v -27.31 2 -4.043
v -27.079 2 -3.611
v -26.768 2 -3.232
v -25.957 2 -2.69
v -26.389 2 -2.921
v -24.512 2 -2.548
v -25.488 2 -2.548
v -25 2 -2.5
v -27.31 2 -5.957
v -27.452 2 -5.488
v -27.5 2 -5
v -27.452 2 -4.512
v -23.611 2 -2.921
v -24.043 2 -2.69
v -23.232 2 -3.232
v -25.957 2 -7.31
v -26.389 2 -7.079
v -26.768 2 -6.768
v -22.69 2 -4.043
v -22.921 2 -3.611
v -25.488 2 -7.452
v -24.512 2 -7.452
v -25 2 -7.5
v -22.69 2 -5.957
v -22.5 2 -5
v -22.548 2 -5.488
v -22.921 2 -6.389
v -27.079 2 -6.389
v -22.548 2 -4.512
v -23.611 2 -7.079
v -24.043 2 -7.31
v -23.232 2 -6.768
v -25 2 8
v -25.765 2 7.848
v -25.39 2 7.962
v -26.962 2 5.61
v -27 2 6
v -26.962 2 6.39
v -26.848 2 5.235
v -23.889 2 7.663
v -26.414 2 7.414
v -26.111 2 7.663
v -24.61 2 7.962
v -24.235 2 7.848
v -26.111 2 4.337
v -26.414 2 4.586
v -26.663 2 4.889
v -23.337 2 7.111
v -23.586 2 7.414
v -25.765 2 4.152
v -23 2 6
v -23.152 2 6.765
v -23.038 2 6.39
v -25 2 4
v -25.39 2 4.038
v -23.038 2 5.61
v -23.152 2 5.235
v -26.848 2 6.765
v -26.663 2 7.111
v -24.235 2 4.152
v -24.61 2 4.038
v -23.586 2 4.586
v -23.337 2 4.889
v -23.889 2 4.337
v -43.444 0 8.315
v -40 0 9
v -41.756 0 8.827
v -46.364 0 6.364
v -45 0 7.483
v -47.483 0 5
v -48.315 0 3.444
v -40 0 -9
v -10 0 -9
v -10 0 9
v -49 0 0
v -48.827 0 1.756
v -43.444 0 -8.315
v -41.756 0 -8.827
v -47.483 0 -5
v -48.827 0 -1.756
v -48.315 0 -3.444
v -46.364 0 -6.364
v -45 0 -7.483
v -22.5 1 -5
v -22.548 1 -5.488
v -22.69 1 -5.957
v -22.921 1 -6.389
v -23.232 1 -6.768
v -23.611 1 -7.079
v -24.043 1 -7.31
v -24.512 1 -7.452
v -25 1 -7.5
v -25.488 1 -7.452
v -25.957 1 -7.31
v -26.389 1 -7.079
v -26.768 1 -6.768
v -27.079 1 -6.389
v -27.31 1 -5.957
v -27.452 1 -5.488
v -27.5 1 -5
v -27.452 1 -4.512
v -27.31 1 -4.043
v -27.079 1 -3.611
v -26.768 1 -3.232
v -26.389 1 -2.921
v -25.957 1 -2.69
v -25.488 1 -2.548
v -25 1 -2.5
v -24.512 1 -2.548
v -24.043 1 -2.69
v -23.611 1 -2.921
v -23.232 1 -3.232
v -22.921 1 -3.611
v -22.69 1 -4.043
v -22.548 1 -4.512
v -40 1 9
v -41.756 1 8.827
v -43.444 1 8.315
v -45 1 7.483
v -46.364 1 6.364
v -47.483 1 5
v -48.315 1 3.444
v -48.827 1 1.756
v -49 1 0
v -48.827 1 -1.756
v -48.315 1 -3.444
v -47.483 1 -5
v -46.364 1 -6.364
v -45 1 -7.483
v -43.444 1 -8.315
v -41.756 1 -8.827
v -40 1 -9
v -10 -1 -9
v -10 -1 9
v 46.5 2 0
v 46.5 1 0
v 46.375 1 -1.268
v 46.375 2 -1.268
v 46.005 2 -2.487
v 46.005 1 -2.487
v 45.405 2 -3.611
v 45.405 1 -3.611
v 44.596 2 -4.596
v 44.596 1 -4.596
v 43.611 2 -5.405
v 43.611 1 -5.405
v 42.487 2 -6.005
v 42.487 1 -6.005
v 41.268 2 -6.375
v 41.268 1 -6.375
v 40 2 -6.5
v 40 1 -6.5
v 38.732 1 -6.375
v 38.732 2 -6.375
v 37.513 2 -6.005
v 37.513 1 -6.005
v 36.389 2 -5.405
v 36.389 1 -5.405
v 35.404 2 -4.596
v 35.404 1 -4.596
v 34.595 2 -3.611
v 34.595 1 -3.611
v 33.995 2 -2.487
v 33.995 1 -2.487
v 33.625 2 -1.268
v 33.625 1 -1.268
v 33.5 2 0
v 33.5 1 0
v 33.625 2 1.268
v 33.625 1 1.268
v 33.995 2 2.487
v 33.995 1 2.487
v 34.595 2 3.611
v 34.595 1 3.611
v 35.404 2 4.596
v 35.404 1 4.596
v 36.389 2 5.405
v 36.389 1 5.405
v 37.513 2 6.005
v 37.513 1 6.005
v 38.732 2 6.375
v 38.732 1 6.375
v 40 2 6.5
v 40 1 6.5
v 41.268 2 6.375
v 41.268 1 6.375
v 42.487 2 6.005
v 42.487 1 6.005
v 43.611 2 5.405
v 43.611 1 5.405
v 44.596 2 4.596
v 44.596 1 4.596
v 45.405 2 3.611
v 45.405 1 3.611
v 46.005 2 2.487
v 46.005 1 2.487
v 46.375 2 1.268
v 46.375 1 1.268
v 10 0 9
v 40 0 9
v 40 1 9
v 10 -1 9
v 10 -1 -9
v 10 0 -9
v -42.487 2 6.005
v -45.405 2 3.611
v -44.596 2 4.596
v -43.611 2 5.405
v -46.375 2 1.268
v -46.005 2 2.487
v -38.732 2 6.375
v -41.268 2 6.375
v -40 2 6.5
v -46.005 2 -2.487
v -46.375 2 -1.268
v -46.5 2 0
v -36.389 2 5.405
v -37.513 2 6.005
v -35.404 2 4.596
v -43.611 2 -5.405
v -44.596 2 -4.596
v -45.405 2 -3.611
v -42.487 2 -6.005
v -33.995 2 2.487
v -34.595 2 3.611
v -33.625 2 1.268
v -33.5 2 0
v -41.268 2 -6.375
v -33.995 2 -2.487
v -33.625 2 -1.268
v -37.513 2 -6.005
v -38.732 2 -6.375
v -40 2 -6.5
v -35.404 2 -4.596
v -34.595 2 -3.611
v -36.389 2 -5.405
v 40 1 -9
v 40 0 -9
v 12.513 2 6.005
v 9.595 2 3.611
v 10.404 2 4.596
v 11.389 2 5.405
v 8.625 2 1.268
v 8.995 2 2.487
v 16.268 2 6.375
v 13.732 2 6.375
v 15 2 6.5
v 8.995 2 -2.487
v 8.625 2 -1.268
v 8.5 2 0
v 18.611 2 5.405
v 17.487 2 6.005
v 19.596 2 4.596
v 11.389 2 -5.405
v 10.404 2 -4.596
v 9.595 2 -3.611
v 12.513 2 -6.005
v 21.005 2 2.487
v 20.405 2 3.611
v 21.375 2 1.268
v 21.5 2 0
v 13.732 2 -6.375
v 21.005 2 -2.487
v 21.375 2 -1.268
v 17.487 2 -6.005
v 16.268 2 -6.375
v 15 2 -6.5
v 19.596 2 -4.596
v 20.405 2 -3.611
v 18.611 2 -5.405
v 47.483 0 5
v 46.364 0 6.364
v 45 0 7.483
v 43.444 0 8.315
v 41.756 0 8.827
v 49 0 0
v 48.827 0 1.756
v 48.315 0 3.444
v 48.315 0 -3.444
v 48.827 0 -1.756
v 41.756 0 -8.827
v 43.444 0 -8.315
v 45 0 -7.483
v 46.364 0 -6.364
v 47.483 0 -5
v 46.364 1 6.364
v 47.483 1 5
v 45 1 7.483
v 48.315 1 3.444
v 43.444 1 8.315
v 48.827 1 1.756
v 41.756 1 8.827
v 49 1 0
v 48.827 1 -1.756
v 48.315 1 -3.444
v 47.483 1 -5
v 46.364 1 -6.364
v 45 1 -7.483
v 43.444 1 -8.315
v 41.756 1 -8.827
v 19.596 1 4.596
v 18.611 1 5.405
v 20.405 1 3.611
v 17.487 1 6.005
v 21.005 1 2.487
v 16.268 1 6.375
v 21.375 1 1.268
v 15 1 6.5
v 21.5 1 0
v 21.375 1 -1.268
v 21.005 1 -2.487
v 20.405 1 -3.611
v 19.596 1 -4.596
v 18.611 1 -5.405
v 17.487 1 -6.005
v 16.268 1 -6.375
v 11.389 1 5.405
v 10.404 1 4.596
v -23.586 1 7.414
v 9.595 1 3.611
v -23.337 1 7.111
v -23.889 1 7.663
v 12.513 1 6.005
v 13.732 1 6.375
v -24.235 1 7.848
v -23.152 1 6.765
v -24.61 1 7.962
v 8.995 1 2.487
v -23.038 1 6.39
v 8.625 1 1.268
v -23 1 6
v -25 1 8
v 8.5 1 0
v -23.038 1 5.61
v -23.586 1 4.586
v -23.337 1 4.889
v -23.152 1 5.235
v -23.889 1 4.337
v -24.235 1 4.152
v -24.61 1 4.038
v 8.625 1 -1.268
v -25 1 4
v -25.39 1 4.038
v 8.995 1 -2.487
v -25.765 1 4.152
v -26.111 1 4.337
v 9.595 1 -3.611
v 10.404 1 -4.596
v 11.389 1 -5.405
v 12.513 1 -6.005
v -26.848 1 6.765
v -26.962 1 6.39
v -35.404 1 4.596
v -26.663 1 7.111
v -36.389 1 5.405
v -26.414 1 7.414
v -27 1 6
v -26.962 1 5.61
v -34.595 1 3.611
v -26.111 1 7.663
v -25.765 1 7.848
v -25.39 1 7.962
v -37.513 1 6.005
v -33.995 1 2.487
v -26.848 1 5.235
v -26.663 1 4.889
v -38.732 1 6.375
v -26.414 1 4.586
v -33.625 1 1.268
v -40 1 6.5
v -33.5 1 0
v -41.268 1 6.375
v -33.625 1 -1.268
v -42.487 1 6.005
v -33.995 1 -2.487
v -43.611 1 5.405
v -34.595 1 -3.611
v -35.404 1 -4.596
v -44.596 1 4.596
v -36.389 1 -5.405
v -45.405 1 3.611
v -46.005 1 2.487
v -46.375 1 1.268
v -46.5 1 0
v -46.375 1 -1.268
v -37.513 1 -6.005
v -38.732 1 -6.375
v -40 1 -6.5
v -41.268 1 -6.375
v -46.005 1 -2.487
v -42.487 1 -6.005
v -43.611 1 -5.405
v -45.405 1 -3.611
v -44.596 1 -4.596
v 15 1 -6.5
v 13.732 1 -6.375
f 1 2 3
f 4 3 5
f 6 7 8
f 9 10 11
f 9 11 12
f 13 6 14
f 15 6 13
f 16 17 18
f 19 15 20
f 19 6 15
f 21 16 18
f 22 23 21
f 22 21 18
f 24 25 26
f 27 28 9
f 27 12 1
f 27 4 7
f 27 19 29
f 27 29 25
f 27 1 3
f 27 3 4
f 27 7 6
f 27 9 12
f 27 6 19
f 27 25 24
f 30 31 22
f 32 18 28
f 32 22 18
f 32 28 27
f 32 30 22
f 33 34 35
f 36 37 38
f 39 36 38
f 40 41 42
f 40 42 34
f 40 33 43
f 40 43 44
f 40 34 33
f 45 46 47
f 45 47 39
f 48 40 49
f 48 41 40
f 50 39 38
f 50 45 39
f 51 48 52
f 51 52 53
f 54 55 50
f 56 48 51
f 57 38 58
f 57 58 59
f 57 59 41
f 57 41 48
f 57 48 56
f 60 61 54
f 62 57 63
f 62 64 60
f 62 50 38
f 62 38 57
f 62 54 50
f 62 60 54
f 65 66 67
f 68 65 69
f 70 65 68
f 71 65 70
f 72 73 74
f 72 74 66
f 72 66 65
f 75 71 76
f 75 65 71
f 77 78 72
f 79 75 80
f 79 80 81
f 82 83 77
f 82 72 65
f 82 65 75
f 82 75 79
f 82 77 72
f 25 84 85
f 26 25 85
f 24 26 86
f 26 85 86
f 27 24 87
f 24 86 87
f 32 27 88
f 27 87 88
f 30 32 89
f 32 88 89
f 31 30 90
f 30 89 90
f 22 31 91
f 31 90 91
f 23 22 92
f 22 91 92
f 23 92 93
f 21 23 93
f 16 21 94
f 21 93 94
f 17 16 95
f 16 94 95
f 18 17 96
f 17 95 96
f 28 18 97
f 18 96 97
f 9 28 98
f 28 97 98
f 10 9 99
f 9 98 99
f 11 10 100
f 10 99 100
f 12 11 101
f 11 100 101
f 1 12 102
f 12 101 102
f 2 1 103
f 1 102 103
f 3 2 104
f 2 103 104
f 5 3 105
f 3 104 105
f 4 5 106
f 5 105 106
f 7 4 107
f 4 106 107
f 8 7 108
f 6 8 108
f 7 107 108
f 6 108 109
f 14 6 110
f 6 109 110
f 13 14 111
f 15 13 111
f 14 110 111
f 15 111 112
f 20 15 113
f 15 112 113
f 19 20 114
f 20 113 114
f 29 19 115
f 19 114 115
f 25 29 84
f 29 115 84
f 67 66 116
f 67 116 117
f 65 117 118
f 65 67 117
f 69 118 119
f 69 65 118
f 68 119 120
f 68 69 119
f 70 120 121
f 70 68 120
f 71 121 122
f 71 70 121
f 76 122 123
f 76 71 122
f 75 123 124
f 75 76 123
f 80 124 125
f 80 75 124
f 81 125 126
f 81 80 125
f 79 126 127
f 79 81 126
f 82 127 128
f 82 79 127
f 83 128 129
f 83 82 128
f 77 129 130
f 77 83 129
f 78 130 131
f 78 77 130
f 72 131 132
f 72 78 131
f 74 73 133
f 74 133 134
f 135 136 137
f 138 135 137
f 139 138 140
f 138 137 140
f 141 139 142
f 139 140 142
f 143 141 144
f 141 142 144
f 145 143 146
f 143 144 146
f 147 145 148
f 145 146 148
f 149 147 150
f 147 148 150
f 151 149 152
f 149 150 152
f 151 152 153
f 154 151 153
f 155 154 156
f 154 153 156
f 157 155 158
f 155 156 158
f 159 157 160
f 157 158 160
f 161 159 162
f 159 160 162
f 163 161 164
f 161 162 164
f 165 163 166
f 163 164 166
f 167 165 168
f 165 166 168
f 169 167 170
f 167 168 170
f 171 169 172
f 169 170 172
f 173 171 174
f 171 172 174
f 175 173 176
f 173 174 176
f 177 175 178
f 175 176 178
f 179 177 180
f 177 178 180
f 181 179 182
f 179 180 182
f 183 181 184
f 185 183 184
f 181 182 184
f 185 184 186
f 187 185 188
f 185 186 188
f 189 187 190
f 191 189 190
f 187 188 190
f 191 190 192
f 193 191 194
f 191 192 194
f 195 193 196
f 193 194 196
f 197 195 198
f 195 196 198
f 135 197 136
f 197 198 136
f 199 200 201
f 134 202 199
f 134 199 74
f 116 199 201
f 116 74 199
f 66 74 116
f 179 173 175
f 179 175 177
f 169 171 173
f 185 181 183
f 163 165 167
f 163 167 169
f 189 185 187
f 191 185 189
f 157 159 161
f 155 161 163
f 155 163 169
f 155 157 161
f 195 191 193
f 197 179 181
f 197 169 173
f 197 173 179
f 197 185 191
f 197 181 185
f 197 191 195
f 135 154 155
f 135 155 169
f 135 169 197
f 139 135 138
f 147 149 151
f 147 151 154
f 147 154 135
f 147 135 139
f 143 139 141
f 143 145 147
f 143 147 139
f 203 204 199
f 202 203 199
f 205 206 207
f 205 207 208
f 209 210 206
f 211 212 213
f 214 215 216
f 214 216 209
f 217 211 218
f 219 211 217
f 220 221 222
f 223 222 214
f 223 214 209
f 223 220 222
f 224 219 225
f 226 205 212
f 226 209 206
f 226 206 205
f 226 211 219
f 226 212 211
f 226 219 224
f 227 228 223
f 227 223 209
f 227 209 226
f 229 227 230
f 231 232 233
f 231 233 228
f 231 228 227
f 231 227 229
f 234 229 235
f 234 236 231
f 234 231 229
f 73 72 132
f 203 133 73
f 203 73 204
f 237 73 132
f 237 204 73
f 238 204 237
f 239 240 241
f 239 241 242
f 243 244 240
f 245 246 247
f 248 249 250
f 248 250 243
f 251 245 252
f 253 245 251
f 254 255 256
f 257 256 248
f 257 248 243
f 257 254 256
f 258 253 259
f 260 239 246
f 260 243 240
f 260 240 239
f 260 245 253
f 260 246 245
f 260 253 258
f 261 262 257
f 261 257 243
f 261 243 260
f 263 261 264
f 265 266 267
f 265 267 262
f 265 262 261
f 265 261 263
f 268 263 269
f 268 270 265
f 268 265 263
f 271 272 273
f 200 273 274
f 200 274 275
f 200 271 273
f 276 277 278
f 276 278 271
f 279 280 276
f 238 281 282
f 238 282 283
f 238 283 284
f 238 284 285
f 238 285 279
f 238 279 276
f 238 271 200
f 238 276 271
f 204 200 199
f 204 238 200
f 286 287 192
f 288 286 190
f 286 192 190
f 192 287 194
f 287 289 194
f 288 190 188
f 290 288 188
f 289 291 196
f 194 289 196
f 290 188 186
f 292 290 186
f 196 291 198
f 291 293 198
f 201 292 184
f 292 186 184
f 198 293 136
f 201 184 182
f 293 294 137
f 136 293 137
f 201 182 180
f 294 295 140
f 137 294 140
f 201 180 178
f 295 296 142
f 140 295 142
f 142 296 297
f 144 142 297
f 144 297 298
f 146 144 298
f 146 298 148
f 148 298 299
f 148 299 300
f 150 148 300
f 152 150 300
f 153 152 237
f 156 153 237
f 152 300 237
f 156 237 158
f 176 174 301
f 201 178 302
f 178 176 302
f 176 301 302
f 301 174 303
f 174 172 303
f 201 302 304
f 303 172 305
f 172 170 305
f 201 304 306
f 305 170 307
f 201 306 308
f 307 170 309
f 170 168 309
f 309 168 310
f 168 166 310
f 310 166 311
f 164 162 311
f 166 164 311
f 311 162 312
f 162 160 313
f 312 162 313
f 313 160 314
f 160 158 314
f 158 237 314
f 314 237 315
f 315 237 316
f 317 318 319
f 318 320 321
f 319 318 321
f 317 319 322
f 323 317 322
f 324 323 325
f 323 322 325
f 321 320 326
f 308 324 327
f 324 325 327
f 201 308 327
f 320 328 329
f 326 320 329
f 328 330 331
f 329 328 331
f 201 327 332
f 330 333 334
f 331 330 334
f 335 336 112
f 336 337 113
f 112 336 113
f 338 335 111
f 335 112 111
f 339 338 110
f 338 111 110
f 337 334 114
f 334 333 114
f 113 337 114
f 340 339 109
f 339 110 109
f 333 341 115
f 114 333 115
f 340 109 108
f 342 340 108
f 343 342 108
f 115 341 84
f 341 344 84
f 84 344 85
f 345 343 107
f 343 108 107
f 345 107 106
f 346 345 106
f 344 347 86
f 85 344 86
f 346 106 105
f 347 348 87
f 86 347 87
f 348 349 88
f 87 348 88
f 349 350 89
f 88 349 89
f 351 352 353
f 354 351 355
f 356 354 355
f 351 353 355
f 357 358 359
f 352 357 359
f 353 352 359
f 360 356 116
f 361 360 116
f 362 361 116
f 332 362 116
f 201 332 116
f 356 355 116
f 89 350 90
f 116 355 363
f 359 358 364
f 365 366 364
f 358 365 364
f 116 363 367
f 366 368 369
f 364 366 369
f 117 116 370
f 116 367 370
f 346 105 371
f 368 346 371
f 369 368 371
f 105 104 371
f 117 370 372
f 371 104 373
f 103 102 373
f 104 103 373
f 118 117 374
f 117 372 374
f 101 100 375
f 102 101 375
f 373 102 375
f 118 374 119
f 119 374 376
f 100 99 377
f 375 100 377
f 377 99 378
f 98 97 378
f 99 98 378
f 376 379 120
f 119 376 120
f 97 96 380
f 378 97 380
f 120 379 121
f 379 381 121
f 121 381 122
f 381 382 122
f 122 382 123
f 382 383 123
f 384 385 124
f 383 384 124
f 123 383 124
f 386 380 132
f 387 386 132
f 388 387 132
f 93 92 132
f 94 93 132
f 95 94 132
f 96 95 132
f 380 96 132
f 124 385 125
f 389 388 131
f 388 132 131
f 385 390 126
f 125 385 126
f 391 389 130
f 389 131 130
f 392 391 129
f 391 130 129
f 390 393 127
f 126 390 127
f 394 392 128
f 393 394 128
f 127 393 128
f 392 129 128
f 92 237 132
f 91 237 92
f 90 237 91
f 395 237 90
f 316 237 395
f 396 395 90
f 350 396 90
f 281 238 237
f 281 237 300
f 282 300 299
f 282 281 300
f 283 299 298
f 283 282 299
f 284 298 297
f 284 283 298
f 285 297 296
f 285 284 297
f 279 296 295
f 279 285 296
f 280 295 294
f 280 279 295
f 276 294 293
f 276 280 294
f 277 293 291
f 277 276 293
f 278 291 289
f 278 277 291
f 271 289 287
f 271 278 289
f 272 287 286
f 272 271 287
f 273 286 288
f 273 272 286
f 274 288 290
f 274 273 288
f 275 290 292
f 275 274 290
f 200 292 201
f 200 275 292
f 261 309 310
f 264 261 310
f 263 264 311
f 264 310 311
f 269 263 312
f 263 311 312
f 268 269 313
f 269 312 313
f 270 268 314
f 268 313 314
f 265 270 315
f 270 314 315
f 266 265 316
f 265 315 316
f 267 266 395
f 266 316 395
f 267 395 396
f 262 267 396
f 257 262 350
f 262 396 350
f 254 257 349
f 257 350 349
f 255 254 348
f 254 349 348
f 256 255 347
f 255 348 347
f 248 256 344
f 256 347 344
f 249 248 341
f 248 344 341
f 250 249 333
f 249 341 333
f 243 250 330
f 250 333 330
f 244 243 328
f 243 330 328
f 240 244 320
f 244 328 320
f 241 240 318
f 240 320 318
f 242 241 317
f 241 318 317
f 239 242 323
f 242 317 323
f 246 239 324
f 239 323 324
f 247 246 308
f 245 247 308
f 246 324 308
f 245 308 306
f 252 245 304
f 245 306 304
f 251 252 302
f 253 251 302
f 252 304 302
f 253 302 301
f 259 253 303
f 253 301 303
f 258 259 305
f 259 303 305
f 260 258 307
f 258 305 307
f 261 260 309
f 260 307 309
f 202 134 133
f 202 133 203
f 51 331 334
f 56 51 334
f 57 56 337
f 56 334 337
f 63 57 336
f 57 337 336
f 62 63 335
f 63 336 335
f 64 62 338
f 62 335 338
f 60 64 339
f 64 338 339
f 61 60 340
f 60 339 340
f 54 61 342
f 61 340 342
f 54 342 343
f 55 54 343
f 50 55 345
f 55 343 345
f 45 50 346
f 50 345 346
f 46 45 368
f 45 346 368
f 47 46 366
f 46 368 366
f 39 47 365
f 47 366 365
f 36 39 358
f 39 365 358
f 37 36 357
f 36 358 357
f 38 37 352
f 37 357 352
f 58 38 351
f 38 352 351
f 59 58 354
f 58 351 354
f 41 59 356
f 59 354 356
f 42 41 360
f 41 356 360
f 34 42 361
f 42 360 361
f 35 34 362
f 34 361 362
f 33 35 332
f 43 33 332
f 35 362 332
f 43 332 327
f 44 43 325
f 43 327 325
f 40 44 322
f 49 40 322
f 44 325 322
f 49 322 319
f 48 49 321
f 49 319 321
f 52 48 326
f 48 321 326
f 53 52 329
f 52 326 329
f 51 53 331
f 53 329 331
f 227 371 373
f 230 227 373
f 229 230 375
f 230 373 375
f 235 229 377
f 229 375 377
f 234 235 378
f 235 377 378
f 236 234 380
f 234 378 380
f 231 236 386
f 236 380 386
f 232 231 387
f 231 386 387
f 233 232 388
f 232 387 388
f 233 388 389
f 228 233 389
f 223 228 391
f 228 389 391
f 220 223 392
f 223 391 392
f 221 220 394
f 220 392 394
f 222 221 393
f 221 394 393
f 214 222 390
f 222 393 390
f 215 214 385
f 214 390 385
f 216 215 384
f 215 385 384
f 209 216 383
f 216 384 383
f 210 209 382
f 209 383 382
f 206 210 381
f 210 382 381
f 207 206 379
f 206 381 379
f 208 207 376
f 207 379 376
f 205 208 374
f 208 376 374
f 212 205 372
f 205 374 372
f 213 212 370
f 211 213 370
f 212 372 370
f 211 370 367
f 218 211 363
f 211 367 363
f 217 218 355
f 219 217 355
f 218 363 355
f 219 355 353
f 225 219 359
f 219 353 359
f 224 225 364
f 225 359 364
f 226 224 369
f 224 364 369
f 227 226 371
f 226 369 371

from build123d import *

# Parameters (mm, degrees)
RESSALTO_EXTRUS_O1_DEPTH = 1
ESBO_O2_R                = 2.5
ESBO_O2_R_2              = 2
ESBO_O2_R_3              = 6.5
RESSALTO_EXTRUS_O2_DEPTH = 1
ESBO_O3_W                = 20
ESBO_O3_H                = 18
RESSALTO_EXTRUS_O3_DEPTH = 1


with BuildPart() as part:
    # Esboço1 → Ressalto-extrusão1 (new body)
    with BuildSketch(Plane(origin=(0, 0, 0), x_dir=(1, 0, 0), z_dir=(0, 1, 0))):
        with BuildLine():
            Line((-40, 9), (40, 9))
            ThreePointArc((40, 9), (49, 0), (40, -9))
            Line((40, -9), (-40, -9))
            ThreePointArc((-40, -9), (-49, 0), (-40, 9))
        make_face()
    extrude(amount=RESSALTO_EXTRUS_O1_DEPTH)

    # Esboço2 → Ressalto-extrusão2 (add)
    with BuildSketch(Plane(origin=(0, 1, 0), x_dir=(1, 0, 0), z_dir=(0, 1, 0))):
        with Locations((-25, 5)):
            Circle(ESBO_O2_R)
        with Locations((-25, -6)):
            Circle(ESBO_O2_R_2)
        with Locations((15, 0)):
            Circle(ESBO_O2_R_3)
        with Locations((40, 0)):
            Circle(ESBO_O2_R_3)
        with Locations((-40, 0)):
            Circle(ESBO_O2_R_3)
    extrude(amount=RESSALTO_EXTRUS_O2_DEPTH)

    # Esboço3 → Ressalto-extrusão3 (add)
    with BuildSketch(Plane.XZ):
        Rectangle(ESBO_O3_W, ESBO_O3_H)
    extrude(amount=RESSALTO_EXTRUS_O3_DEPTH)


solid = part.part
